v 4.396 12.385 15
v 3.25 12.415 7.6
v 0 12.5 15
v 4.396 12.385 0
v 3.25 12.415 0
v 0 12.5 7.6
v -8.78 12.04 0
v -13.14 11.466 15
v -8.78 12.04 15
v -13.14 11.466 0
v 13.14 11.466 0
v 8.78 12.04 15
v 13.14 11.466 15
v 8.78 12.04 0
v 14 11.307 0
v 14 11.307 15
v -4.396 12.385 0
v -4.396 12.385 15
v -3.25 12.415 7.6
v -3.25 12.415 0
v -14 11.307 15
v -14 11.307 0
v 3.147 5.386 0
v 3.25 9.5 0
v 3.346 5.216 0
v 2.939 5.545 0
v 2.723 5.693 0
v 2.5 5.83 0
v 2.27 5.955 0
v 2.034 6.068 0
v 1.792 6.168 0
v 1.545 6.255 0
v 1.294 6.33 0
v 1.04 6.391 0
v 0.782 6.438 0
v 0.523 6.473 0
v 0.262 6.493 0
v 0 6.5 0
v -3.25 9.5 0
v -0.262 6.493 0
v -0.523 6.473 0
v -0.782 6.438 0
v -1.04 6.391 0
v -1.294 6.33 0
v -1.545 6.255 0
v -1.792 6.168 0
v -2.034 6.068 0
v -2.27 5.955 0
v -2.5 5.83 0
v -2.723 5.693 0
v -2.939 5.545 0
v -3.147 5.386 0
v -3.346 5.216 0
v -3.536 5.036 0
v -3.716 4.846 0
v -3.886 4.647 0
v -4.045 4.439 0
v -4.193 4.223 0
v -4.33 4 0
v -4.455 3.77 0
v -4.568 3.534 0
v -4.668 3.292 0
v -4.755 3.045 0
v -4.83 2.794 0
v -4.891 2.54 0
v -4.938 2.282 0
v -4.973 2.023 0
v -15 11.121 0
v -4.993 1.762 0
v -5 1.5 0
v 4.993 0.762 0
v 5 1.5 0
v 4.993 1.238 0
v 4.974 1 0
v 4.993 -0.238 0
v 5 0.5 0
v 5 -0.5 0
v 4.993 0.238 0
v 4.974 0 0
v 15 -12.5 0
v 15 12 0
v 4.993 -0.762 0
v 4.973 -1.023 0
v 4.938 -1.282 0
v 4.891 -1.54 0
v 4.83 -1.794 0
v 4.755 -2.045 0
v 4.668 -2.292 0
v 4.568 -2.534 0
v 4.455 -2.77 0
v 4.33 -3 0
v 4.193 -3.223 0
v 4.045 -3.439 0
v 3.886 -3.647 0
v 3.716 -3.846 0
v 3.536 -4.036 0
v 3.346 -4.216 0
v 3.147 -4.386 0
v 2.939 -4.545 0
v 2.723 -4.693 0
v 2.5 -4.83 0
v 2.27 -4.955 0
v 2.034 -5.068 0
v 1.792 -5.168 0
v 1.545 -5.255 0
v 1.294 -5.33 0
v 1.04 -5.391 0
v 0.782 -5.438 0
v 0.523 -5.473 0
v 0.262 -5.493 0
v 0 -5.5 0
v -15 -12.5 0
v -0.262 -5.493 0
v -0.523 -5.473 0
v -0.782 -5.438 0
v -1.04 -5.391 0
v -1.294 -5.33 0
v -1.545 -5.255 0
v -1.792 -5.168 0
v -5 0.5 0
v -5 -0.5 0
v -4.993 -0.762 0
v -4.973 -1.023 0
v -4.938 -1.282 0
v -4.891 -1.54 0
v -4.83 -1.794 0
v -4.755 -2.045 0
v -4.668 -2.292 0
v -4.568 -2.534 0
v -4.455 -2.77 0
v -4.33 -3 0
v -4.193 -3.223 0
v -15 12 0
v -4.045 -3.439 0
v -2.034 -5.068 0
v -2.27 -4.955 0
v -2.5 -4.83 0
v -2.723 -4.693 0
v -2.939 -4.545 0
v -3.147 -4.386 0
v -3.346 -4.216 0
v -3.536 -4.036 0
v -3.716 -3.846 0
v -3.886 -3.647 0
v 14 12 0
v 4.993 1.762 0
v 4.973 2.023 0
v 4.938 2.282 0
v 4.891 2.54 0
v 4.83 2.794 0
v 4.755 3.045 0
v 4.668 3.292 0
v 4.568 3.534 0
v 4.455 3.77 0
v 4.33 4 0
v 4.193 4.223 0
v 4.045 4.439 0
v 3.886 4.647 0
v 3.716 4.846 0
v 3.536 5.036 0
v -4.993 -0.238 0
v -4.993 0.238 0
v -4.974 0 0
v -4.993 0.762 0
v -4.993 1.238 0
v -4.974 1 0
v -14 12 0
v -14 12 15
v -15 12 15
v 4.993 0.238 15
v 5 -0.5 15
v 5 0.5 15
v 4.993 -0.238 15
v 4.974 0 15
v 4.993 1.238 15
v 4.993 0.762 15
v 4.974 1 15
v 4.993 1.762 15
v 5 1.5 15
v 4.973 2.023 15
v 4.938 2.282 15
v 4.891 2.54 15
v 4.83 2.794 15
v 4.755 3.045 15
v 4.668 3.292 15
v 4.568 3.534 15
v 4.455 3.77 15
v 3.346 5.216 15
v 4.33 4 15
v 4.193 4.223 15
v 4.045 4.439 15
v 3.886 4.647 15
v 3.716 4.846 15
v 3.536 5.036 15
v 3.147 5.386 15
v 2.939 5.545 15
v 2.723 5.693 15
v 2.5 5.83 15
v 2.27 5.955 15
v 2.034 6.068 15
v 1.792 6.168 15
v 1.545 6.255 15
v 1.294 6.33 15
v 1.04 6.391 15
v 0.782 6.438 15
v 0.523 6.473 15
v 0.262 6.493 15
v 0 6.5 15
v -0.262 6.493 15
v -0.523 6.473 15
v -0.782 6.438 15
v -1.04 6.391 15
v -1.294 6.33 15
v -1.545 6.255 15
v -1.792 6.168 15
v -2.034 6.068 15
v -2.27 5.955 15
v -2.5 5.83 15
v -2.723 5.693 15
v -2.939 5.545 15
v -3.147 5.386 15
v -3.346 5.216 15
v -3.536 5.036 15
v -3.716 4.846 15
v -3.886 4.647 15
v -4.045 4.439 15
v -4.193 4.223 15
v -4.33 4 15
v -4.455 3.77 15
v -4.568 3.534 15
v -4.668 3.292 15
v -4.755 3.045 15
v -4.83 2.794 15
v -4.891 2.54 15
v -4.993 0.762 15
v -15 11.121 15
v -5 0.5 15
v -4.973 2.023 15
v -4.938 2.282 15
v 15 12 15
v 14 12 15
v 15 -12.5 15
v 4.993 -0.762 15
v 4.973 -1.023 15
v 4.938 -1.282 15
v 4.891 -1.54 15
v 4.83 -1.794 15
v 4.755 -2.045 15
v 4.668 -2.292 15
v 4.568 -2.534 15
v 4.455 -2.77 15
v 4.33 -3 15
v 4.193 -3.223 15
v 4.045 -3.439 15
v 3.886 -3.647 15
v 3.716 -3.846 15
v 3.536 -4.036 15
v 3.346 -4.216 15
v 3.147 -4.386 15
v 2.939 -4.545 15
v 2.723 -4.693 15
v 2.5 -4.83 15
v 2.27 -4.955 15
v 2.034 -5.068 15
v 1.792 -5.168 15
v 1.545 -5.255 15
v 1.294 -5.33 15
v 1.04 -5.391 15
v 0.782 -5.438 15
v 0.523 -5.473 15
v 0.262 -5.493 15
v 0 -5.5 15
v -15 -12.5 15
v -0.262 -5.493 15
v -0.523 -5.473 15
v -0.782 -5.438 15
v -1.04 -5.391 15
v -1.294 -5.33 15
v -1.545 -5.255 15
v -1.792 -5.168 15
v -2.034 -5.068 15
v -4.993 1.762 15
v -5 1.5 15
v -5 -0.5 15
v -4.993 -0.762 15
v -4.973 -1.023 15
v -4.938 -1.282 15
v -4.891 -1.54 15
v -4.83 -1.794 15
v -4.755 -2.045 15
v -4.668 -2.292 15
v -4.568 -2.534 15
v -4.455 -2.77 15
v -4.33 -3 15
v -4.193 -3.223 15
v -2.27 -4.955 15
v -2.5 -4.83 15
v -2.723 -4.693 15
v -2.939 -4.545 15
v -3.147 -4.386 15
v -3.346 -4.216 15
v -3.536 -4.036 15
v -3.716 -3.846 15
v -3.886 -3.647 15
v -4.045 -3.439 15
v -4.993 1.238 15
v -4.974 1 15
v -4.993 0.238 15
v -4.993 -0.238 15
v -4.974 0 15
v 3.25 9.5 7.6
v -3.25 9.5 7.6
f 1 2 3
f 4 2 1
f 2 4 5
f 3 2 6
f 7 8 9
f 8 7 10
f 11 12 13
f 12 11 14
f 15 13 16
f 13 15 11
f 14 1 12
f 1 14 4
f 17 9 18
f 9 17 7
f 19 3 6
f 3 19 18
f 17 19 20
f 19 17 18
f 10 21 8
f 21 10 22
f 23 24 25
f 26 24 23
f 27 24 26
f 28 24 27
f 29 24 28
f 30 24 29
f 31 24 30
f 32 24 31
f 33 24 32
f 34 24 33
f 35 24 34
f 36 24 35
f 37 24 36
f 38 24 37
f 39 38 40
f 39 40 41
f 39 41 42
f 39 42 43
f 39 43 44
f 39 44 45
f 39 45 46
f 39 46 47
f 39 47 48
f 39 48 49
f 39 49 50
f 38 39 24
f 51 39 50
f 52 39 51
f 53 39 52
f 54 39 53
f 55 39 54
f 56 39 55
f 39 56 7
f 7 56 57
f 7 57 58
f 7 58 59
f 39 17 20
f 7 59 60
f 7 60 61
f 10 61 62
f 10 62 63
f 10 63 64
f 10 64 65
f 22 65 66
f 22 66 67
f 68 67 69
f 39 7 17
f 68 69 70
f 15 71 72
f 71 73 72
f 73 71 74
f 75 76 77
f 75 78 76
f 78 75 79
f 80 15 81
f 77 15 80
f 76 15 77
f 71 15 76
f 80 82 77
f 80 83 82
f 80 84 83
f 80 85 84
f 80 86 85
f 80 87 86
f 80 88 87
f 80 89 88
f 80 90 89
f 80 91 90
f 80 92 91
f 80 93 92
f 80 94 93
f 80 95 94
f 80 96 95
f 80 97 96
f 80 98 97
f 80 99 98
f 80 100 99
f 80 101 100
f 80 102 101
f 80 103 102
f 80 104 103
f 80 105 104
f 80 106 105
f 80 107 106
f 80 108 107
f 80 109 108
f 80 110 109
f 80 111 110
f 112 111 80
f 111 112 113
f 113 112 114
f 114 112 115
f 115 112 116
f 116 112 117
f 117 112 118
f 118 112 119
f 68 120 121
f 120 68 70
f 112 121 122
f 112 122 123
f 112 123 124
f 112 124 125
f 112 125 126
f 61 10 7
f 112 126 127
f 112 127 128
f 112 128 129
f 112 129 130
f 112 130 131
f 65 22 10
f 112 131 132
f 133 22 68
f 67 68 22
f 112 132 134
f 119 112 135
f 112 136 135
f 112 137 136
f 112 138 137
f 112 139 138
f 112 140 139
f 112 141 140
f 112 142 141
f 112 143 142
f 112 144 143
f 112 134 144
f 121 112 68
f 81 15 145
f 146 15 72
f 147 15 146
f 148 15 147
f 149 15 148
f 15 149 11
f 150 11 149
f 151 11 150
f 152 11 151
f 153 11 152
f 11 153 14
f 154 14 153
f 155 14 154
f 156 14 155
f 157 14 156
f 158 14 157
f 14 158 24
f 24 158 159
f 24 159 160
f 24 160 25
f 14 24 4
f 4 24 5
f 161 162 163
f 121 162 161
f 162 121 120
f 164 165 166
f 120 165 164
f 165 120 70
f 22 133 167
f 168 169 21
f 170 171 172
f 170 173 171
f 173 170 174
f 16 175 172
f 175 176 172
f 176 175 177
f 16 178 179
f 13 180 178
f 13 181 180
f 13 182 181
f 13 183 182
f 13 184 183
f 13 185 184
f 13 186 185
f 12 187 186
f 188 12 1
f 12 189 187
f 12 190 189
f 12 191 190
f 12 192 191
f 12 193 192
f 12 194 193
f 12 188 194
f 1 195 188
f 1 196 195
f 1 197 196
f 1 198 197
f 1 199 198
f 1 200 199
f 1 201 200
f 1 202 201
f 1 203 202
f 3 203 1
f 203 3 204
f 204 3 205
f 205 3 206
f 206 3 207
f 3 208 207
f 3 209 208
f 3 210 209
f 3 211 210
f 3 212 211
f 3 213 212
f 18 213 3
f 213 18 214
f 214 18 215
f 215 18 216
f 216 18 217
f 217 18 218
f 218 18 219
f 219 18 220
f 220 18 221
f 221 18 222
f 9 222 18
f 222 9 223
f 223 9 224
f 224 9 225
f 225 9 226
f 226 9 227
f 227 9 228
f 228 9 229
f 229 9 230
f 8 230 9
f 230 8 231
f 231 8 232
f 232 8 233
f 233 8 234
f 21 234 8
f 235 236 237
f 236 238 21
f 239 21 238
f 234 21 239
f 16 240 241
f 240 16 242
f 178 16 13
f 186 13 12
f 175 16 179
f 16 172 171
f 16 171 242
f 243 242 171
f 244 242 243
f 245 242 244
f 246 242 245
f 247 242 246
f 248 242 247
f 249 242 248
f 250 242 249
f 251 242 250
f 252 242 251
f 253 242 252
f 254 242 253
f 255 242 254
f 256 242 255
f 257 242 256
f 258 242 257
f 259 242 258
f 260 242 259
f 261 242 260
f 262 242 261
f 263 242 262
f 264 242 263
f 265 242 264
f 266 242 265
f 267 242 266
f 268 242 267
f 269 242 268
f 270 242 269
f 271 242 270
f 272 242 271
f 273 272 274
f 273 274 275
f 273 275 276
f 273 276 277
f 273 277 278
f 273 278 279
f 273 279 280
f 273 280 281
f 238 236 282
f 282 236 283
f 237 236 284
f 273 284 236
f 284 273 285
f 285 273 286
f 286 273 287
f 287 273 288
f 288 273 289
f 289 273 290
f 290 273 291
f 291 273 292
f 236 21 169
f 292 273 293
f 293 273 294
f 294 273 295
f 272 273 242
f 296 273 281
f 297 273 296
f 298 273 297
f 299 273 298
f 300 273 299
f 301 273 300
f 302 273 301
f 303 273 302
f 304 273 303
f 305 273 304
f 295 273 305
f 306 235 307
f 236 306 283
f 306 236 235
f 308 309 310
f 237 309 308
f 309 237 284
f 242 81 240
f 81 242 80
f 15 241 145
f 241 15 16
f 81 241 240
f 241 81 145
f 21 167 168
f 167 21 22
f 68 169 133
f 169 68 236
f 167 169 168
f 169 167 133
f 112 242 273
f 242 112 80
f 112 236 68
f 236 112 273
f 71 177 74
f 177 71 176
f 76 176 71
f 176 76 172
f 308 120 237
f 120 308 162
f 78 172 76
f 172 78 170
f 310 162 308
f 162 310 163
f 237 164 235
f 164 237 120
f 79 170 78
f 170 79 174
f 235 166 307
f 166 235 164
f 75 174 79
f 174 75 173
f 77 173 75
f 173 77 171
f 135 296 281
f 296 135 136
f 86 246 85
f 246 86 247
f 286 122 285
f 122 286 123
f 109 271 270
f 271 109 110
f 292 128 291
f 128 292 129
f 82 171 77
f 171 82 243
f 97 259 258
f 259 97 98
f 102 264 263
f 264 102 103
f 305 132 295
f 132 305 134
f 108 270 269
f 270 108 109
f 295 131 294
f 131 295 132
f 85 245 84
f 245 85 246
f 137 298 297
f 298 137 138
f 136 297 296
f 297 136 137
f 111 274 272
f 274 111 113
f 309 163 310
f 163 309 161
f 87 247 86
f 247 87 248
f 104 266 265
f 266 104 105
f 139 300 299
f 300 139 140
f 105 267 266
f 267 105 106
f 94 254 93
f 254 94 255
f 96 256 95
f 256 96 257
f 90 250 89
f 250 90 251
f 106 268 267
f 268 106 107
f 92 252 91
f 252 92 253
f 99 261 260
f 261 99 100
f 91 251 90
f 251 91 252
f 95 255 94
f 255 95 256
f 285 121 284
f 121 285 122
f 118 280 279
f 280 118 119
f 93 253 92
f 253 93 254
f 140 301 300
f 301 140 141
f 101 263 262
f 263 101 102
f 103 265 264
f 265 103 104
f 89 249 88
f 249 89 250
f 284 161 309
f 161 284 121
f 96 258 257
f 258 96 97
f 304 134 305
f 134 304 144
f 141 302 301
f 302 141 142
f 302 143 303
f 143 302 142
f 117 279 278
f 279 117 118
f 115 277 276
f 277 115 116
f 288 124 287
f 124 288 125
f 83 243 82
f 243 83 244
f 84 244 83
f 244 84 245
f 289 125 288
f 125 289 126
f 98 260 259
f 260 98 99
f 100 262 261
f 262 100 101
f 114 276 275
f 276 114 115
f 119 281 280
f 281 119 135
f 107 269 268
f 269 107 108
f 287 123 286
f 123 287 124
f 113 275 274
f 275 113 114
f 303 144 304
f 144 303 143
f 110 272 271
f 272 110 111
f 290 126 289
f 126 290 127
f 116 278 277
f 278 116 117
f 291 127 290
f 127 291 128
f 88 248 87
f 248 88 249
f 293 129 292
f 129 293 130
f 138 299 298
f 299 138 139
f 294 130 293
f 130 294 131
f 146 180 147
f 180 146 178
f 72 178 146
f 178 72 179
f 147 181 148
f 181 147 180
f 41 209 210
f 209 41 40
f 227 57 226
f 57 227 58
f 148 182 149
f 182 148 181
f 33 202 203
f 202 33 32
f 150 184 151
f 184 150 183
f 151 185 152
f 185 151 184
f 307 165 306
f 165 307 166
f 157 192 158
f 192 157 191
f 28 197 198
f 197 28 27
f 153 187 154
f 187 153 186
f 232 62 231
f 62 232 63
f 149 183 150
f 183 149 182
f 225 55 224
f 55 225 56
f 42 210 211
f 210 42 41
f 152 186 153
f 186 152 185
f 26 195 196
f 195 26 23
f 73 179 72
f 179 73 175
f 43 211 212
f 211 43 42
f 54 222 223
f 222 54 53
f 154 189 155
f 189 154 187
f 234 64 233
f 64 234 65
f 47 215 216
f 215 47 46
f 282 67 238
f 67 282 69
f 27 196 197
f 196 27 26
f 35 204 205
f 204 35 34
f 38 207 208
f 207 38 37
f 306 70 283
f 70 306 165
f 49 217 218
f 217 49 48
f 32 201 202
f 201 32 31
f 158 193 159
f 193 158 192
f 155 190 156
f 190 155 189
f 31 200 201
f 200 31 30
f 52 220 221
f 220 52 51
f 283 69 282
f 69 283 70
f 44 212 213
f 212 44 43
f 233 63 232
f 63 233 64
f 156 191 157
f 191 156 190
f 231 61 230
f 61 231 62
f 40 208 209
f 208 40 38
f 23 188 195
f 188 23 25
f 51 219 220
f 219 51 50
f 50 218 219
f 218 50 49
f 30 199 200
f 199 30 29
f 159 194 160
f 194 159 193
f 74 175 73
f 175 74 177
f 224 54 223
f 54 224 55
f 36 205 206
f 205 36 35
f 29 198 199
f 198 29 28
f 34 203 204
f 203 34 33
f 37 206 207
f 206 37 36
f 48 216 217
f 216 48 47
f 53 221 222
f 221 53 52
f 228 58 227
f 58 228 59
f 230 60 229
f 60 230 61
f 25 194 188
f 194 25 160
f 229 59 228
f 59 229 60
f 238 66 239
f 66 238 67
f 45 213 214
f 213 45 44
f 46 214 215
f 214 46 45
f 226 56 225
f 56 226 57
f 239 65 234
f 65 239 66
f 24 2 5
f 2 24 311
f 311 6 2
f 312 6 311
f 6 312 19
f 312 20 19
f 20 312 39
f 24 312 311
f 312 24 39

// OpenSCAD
jar_inner_diameter     = 168;

float_width            = 30;
float_depth            = 25;
float_height           = 15;

magnet_width           = 6.5;
magnet_depth           = 3;

shaft_diameter         = 10;
shaft_inset            = 12;

standoff_width         = 1;
standoff_depth         = 0.75;

epsilon                = 0.1;
$fn = 120;


translate([0, -jar_inner_diameter/2 + float_depth/2 , 0])
    difference() {
        union() {
            cylinder(h=float_height, d=jar_inner_diameter);
            
            // +ve x stand-off
            translate([float_width/2 - standoff_width - 0*epsilon, 0, 0])
                cube(size = [standoff_width, jar_inner_diameter/2 - 0.5, float_height]);
            // -ve x stand-off
            translate([-float_width/2 + 0.00001*standoff_width - 0*epsilon, 0, 0])
                cube(size = [standoff_width, jar_inner_diameter/2 - 0.5, float_height]);

        }
        union() {
            // rear
            translate([-jar_inner_diameter/2, -jar_inner_diameter/2, -epsilon])
                cube(size = [jar_inner_diameter, jar_inner_diameter - float_depth, float_height+2*epsilon]);
            // +ve x
            translate([float_width/2, 0, -epsilon])
                cube(size = [jar_inner_diameter, jar_inner_diameter, float_height+2*epsilon]);
            // -ve x
            translate([-jar_inner_diameter-float_width/2, 0, -epsilon])
                cube(size = [jar_inner_diameter, jar_inner_diameter, float_height+2*epsilon]);

            // mounting hole
            translate([0, jar_inner_diameter/2 - shaft_inset, -epsilon])
                cylinder(h=float_height+2*epsilon, d=shaft_diameter);
            translate([0, jar_inner_diameter/2 - shaft_inset-1, -epsilon])
                cylinder(h=float_height+2*epsilon, d=shaft_diameter);
            // was -2 before but shifted it forward so the float has a bit more room between the pole and the jar
            translate([0, jar_inner_diameter/2 - shaft_inset+1, -epsilon]) 
                cylinder(h=float_height+2*epsilon, d=shaft_diameter);

            // magnet inset
            translate([-magnet_width/2, jar_inner_diameter/2 - magnet_depth, -epsilon])
                cube(size = [magnet_width, magnet_depth, float_height/2+2*epsilon]);
        }
    }
